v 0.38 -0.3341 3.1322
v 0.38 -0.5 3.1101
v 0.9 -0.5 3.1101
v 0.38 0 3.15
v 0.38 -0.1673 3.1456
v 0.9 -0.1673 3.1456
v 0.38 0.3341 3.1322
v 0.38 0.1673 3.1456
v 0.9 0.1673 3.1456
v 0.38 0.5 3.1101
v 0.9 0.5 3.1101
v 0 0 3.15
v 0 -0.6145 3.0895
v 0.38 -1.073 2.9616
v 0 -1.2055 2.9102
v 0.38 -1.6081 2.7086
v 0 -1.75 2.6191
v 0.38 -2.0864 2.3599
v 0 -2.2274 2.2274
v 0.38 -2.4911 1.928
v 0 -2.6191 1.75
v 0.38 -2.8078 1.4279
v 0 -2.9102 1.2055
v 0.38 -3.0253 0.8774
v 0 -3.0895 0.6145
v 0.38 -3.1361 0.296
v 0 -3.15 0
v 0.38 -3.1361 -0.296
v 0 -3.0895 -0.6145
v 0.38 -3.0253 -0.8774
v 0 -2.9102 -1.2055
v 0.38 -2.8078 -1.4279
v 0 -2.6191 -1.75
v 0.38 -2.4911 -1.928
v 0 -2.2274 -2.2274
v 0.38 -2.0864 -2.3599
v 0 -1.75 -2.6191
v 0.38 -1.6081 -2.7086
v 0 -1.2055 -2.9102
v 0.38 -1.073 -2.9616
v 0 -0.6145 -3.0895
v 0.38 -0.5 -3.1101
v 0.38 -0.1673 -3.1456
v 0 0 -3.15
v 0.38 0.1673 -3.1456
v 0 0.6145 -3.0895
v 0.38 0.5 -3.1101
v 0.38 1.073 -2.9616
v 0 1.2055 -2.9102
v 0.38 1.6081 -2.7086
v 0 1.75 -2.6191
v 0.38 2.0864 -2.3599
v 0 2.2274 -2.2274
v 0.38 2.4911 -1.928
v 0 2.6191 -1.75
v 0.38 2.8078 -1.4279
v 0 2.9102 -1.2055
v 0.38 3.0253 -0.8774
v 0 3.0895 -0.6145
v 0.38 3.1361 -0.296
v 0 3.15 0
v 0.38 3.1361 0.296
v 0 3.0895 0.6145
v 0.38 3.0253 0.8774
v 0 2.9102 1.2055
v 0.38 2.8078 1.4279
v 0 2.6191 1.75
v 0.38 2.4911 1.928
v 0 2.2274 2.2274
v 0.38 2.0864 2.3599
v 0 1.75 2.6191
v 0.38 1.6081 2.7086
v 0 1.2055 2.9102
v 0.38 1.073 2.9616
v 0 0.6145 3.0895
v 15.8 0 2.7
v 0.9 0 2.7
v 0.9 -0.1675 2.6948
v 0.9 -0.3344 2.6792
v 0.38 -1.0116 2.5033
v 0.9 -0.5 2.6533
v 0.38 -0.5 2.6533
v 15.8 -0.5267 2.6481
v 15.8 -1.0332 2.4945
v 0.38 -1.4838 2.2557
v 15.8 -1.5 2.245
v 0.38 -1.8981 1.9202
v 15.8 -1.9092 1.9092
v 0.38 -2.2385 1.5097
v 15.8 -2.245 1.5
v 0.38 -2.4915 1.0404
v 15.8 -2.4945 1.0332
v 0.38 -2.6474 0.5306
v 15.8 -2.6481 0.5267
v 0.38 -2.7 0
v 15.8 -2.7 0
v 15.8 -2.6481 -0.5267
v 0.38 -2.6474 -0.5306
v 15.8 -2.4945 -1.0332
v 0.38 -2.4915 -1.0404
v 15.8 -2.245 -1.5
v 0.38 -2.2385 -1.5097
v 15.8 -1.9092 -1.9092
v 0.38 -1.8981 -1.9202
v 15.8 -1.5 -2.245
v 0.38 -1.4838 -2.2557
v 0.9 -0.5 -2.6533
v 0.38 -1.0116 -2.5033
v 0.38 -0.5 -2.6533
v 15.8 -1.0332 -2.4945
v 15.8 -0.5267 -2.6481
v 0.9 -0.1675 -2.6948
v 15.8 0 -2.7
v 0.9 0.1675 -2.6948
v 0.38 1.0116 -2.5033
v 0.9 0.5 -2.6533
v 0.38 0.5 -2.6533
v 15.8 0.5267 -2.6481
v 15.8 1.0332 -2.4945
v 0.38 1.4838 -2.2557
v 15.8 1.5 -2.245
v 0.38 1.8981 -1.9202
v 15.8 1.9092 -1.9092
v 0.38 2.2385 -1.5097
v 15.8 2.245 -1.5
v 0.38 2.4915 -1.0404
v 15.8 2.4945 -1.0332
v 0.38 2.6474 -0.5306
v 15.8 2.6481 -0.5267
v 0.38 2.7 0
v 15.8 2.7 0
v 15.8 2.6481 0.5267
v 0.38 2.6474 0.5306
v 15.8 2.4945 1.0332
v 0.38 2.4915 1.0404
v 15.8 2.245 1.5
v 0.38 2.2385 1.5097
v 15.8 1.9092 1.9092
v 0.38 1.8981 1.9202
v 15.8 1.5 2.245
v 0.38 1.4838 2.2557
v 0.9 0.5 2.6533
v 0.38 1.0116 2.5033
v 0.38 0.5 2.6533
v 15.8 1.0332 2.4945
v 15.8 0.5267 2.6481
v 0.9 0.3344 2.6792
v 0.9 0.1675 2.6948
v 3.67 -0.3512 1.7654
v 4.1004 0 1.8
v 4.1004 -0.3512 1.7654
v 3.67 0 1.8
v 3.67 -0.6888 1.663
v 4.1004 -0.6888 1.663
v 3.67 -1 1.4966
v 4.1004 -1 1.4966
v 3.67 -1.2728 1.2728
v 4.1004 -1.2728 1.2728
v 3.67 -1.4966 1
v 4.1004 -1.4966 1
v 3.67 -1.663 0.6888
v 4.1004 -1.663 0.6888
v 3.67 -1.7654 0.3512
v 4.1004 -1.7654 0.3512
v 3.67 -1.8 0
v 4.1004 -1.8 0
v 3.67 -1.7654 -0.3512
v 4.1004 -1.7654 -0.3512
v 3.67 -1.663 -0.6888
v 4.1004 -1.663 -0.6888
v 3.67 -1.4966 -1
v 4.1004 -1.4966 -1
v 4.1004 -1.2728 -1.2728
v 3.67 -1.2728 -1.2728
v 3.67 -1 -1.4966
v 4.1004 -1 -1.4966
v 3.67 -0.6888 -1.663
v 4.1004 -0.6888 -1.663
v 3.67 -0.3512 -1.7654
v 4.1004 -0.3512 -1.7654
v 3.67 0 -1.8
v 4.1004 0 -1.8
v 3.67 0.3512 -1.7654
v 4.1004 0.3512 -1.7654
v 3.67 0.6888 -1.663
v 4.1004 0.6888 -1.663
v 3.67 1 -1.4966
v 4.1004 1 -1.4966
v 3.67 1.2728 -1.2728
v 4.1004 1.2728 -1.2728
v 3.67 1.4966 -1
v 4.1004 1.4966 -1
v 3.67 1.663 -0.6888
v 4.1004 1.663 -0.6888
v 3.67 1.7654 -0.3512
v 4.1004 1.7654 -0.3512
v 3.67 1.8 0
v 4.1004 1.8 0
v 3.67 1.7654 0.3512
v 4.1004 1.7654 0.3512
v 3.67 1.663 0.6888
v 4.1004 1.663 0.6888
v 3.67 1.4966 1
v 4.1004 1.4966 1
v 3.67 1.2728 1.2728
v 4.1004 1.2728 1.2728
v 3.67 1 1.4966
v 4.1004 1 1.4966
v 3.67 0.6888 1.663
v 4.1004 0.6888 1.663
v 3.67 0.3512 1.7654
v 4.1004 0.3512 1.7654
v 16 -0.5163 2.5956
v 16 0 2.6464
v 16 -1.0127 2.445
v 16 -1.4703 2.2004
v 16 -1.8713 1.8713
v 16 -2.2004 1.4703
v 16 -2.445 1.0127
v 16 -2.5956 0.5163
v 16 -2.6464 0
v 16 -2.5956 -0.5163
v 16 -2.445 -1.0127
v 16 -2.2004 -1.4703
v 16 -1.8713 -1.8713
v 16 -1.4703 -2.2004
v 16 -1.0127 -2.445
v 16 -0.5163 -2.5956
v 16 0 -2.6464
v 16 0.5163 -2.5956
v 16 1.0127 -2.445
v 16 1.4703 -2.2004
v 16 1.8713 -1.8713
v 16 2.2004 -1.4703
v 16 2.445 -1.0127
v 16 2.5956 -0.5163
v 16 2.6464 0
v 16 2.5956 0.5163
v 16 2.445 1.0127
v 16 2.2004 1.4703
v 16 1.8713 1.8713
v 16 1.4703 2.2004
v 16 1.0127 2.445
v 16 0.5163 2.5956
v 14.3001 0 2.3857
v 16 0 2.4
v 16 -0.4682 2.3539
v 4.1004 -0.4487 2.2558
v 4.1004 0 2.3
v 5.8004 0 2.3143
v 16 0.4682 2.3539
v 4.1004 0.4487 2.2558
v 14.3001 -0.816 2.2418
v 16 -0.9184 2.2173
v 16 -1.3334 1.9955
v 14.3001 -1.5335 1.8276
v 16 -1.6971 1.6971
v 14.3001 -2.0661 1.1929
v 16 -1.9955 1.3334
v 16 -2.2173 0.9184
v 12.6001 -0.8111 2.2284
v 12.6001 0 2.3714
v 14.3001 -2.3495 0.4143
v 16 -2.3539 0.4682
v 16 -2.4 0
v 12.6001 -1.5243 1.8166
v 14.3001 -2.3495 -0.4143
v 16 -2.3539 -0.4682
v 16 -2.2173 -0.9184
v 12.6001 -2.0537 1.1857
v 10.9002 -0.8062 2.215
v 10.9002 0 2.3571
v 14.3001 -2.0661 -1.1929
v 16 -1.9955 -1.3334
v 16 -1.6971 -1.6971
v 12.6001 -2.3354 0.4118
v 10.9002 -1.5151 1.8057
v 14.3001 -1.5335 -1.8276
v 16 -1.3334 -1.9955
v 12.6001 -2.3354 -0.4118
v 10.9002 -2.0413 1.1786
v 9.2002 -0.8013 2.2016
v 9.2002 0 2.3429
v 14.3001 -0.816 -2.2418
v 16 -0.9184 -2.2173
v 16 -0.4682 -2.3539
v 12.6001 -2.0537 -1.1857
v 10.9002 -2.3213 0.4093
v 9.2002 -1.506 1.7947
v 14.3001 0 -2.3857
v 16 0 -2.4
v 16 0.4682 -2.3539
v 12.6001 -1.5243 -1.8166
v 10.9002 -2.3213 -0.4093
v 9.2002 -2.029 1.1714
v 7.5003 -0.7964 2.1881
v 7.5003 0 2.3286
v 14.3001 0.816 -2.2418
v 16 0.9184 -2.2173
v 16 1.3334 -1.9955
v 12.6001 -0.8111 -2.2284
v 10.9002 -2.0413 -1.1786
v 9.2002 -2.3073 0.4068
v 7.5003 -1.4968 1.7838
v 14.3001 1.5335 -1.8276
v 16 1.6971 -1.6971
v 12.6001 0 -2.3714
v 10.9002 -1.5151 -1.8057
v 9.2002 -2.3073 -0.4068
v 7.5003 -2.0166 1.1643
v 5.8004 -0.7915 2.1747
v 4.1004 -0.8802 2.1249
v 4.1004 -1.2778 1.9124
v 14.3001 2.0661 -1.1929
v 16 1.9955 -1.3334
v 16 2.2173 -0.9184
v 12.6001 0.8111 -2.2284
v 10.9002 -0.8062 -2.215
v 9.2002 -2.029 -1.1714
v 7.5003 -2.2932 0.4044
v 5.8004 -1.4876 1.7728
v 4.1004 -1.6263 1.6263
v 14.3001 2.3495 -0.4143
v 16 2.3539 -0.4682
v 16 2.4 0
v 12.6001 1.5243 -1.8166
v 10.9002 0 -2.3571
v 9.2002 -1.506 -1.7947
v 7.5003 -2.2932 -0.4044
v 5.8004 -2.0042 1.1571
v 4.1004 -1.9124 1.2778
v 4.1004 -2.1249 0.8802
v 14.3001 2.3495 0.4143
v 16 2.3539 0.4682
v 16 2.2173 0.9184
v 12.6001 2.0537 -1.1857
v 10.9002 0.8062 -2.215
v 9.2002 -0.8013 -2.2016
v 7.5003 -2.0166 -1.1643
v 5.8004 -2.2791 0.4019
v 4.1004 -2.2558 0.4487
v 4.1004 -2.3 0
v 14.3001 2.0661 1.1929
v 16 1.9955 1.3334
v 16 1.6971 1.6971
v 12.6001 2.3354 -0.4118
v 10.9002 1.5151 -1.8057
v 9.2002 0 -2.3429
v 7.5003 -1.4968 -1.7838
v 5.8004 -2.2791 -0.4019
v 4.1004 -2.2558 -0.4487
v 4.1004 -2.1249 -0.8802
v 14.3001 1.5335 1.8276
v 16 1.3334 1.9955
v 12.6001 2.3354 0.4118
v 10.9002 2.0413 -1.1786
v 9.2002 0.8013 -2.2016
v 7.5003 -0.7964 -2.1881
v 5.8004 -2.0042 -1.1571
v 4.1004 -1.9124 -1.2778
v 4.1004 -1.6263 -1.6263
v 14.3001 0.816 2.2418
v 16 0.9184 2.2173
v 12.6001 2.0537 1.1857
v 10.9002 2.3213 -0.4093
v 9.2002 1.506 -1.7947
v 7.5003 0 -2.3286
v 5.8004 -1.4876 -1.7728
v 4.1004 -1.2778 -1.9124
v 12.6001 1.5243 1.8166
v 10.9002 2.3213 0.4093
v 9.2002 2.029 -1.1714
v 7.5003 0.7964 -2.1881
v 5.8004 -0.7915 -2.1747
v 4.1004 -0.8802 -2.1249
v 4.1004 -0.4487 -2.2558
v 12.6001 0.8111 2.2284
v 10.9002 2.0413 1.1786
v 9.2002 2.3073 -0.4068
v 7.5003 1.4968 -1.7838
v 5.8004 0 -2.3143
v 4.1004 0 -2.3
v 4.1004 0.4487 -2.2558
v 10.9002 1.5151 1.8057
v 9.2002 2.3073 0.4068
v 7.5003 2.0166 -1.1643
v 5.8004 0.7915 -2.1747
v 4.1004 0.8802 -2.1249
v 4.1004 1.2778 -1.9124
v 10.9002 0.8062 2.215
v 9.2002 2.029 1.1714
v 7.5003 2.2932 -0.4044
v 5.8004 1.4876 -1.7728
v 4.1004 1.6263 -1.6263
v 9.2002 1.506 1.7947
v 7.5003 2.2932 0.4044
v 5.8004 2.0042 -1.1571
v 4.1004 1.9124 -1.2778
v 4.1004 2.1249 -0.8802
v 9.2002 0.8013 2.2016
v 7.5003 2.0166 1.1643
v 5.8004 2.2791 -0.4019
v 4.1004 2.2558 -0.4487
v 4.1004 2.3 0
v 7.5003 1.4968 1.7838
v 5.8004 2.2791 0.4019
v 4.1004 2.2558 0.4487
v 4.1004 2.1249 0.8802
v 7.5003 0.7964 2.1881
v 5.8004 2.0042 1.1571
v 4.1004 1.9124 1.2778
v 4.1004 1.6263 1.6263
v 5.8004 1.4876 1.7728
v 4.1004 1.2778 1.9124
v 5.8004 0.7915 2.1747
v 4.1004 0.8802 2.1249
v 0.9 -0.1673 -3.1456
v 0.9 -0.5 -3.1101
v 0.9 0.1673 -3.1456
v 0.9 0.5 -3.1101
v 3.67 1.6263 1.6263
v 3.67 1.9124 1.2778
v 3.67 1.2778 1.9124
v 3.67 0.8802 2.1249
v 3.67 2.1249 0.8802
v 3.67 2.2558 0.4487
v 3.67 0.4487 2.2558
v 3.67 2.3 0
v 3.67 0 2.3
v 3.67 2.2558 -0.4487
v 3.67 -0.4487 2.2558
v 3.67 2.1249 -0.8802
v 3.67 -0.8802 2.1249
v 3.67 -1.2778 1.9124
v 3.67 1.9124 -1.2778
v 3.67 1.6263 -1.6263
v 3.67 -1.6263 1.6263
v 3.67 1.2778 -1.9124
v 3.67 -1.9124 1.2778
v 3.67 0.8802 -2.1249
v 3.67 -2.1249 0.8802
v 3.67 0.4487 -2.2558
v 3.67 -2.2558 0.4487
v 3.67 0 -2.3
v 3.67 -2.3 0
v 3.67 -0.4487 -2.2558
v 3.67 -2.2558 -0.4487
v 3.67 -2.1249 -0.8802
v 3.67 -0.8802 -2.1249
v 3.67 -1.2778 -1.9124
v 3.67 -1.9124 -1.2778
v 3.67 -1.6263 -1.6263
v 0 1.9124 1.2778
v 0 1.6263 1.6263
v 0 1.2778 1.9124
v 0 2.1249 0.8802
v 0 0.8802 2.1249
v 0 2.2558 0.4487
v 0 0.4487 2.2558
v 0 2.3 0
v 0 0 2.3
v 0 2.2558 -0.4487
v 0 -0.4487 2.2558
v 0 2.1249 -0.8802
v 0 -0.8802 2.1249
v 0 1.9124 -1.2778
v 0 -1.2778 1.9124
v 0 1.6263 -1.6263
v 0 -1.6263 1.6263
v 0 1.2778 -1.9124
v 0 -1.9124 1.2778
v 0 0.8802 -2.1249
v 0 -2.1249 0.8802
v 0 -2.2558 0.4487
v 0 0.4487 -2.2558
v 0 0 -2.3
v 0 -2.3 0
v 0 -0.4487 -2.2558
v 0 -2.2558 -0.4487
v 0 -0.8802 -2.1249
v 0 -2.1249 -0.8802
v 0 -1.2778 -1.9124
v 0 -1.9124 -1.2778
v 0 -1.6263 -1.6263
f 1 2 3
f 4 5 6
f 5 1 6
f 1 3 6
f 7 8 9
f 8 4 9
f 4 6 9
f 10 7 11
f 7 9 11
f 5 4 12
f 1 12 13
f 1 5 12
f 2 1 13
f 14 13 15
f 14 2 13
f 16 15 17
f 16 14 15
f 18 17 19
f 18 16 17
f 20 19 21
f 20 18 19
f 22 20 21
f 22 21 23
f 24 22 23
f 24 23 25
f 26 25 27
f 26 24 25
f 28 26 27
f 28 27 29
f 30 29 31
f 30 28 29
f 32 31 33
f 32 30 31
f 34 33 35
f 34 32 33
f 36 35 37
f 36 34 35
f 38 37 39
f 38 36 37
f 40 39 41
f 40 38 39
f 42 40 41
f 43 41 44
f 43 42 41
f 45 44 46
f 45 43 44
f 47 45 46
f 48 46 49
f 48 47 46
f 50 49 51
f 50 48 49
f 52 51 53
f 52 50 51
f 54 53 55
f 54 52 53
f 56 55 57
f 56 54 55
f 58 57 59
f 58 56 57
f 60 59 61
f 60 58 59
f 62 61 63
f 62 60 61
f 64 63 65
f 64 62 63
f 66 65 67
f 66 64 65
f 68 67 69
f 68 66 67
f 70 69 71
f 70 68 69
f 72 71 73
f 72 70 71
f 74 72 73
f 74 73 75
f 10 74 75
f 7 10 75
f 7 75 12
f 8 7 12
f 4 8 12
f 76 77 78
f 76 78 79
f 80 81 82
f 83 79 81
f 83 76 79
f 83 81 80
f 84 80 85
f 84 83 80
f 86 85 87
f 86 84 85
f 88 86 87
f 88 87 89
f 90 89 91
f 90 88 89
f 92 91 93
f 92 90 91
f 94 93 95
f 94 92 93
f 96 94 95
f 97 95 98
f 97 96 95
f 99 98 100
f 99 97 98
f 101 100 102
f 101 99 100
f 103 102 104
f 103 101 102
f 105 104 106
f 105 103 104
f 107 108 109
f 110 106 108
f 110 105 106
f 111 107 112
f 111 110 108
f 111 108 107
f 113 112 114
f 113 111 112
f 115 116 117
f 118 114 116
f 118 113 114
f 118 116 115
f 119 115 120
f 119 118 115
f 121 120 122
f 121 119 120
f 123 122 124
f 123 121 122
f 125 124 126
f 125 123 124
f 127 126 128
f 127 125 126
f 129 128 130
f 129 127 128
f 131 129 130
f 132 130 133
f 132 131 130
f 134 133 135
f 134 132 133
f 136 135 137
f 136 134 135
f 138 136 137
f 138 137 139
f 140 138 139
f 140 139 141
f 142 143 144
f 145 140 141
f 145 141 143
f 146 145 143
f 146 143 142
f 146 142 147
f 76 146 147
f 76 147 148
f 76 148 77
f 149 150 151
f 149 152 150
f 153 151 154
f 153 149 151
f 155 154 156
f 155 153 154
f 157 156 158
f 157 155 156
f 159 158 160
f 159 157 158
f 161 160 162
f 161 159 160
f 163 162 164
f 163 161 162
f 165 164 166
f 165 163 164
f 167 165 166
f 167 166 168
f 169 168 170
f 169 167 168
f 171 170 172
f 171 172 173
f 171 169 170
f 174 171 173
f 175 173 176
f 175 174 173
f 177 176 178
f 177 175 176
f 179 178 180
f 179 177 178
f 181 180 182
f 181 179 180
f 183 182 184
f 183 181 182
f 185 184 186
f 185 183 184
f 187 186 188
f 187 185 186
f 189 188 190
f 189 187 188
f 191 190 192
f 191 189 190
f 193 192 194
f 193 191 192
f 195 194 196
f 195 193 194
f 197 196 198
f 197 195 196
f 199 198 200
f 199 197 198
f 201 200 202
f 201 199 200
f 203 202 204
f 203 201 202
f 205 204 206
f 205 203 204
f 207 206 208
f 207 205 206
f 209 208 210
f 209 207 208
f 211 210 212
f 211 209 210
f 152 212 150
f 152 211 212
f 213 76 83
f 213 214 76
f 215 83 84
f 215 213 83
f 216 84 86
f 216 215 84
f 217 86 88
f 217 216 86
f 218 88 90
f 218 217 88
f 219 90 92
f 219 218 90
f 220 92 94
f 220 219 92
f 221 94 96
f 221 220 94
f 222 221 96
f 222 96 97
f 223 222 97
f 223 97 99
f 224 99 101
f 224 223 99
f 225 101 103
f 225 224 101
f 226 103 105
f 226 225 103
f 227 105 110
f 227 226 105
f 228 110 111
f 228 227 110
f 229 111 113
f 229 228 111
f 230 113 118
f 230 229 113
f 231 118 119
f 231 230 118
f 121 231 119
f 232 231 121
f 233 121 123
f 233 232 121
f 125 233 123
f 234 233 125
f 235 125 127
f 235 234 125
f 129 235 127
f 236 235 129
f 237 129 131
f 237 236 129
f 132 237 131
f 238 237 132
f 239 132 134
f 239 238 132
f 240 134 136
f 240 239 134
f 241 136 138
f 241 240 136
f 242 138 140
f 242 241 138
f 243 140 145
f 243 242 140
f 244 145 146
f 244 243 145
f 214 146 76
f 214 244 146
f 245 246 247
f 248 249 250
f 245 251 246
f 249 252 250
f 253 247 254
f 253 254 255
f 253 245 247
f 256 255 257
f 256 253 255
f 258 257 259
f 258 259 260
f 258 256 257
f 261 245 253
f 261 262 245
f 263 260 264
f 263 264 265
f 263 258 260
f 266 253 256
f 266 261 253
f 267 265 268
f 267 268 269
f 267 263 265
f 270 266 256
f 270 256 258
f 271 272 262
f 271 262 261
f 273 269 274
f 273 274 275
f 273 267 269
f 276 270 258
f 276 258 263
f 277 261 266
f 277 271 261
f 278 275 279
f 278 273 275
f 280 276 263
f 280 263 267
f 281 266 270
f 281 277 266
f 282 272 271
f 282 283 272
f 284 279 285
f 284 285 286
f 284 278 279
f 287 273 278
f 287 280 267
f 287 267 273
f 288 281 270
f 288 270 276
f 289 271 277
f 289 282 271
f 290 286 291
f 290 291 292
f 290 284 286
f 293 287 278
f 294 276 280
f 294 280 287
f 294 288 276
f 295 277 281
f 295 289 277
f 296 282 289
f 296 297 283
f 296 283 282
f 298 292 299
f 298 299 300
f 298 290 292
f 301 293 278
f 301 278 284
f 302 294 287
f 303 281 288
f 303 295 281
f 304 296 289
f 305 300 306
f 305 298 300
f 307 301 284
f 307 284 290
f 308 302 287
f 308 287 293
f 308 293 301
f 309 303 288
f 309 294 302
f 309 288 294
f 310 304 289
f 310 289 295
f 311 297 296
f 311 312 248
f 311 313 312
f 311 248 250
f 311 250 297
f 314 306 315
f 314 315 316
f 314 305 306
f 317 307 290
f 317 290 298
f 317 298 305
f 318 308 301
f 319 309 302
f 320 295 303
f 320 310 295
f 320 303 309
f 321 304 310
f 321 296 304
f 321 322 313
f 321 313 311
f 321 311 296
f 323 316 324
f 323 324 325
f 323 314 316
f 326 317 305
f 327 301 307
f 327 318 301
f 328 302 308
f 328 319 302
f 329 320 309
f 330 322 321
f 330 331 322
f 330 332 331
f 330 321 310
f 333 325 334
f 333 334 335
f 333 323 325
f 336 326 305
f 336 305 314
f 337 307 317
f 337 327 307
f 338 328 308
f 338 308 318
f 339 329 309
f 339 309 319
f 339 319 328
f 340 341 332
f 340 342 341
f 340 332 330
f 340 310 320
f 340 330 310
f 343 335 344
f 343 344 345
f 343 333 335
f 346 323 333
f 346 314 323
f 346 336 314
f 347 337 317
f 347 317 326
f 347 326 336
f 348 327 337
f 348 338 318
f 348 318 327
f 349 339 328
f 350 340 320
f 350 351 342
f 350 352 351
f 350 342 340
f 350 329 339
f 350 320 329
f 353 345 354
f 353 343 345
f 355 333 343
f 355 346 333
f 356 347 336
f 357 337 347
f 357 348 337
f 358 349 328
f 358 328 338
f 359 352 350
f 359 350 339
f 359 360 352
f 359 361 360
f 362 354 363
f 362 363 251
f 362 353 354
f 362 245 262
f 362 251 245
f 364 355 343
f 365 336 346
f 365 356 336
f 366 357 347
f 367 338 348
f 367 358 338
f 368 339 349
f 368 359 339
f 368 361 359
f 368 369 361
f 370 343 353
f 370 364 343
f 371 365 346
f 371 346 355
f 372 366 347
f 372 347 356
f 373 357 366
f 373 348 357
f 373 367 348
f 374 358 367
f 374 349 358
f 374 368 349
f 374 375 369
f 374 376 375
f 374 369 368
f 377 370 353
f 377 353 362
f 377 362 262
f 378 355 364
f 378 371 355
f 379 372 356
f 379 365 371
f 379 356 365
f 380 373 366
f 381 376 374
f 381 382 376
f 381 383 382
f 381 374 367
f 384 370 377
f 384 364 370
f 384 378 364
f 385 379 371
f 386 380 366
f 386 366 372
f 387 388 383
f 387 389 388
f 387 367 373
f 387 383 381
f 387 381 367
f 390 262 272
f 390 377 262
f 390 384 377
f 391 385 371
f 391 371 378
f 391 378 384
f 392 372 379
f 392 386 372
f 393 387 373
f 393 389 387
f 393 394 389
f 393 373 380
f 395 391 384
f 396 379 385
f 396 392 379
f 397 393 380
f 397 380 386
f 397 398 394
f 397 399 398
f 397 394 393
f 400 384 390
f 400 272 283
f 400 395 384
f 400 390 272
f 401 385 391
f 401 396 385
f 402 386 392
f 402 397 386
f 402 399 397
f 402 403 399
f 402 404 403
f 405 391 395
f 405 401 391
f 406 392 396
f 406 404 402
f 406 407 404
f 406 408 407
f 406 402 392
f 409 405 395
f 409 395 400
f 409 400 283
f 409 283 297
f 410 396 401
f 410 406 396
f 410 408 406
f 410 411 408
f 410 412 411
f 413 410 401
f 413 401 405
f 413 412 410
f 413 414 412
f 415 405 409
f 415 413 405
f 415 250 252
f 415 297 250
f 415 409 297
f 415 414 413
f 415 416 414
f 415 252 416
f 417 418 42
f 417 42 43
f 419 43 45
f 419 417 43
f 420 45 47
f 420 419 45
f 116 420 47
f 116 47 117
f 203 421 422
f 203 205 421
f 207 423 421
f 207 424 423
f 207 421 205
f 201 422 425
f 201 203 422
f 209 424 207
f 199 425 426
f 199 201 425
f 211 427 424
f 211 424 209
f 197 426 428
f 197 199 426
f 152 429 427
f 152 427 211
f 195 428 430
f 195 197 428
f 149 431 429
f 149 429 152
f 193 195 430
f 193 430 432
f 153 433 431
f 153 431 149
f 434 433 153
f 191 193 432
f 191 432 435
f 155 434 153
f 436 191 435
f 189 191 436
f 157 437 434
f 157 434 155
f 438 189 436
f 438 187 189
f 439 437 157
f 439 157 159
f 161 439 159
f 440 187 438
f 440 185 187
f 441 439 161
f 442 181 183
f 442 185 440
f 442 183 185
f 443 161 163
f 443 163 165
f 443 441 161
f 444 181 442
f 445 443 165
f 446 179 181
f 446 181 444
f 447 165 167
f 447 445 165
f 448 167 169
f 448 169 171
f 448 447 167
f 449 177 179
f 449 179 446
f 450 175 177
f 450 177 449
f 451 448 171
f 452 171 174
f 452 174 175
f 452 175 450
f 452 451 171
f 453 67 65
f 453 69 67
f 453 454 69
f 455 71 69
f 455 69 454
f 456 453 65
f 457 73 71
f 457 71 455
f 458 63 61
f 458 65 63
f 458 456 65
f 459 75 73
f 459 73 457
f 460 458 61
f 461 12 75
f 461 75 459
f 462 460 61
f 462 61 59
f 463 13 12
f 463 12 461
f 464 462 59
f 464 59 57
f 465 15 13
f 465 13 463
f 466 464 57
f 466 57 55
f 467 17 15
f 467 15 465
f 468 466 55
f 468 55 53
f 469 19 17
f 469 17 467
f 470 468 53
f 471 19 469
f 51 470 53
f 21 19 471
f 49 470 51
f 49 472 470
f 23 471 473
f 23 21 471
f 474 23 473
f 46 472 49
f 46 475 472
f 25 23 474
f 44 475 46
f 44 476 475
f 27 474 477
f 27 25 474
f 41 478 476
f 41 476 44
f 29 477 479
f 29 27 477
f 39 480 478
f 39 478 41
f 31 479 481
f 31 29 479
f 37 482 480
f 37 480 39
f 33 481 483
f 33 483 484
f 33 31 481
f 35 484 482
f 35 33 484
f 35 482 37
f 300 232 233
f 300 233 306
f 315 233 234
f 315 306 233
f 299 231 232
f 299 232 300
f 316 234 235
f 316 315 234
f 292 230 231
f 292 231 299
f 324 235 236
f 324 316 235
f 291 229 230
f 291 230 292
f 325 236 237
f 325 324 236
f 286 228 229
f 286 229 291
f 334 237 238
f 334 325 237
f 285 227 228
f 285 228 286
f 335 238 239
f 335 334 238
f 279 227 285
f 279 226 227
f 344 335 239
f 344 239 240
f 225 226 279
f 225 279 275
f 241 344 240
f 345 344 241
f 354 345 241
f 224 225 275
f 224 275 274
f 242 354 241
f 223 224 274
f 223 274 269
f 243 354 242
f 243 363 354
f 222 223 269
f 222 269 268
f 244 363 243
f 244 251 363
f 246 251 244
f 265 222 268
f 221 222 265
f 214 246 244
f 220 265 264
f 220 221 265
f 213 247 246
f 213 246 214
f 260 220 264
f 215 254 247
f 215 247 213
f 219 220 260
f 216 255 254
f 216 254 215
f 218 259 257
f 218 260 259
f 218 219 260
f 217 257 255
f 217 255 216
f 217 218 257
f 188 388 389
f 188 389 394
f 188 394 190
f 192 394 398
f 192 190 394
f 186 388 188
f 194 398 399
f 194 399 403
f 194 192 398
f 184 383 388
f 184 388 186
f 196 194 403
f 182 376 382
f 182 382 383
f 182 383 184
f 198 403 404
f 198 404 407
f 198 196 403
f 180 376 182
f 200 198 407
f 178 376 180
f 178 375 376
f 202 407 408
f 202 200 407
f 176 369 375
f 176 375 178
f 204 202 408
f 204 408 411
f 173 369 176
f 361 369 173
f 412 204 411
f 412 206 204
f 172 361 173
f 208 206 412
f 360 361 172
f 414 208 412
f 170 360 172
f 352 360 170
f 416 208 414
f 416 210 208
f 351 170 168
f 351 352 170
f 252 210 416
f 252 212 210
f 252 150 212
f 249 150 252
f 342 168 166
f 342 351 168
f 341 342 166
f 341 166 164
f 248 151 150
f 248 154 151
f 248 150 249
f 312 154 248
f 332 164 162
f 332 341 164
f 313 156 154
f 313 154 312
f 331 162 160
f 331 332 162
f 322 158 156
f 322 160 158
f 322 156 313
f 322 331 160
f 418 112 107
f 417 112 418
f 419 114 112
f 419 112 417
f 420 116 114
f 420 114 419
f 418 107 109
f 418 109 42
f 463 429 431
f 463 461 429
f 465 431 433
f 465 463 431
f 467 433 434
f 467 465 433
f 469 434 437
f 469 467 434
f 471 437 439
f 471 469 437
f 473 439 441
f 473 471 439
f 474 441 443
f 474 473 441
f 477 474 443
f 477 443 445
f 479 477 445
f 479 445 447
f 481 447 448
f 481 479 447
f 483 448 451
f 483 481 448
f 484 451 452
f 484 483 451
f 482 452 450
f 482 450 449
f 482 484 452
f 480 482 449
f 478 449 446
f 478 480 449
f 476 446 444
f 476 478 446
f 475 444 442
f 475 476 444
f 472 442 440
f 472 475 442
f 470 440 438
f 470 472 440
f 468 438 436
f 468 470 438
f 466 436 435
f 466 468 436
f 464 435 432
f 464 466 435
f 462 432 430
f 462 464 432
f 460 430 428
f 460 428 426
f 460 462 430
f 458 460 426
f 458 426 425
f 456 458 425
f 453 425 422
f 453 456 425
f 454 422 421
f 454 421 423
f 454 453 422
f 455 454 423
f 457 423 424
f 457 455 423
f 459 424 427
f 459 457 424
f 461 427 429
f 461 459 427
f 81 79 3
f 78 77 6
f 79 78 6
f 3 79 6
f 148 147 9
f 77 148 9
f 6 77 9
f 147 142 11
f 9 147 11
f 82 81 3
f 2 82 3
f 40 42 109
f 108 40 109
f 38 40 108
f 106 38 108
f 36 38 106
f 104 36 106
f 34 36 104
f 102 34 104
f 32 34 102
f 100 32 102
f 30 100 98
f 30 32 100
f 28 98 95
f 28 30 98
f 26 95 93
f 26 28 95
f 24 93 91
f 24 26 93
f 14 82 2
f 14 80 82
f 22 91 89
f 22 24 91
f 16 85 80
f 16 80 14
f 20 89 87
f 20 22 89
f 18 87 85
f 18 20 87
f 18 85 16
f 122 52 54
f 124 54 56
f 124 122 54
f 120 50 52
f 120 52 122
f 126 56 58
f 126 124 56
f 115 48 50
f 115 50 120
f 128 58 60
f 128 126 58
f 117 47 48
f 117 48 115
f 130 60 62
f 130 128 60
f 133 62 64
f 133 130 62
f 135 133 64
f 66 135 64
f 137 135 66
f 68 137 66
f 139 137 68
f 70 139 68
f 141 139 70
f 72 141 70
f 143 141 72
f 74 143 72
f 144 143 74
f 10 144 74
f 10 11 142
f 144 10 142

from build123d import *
from build123d.topology import SkipClean

# Parameters (mm, degrees)
RESSALTO_EXTRUS_O1_START = 0.52
RESSALTO_EXTRUS_O1_DEPTH = 0.52


with BuildPart() as part:
    # Esboço1 → Revolução1 (revolve)
    with BuildSketch(Plane.XY, mode=Mode.PRIVATE) as revolu_o1_sk:
        Polygon((0.38, 2.7), (15.8, 2.7), (16, 2.646410162), (16, 2.4), (4.100420175, 2.3), (4.100420175, 1.8), (3.67, 1.8), (3.67, 2.3), (0, 2.3), (0, 3.15), (0.38, 3.15), align=None)
    revolve(revolu_o1_sk.sketch.rotate(Axis((0, 0, 0), (1, 0, 0)), 90), axis=Axis((0, 0, 0), (1, 0, 0)))

    # Esboço3 → Ressalto-extrusão1 (add)
    with SkipClean():  # the faces are left unmerged after this step: merging them gives an invalid solid
        with BuildSketch(Plane(origin=(0.38, 0, 0), x_dir=(0, 0, -1), z_dir=(1, 0, 0)).offset(RESSALTO_EXTRUS_O1_START)):
            with BuildLine():
                Line((-3.110064308, 0.5), (-2.653299832, 0.5))
                ThreePointArc((-2.653299832, 0.5), (-2.7, 0), (-2.653299832, -0.5))
                Line((-2.653299832, -0.5), (-3.110064308, -0.5))
                ThreePointArc((-3.110064308, -0.5), (-3.15, 0), (-3.110064308, 0.5))
            make_face()
            with BuildLine():
                Line((2.653299832, -0.5), (3.110064308, -0.5))
                ThreePointArc((3.110064308, -0.5), (3.15, 0), (3.110064308, 0.5))
                Line((3.110064308, 0.5), (2.653299832, 0.5))
                ThreePointArc((2.653299832, 0.5), (2.7, 0), (2.653299832, -0.5))
            make_face()
        extrude(amount=-RESSALTO_EXTRUS_O1_DEPTH)


solid = part.part
